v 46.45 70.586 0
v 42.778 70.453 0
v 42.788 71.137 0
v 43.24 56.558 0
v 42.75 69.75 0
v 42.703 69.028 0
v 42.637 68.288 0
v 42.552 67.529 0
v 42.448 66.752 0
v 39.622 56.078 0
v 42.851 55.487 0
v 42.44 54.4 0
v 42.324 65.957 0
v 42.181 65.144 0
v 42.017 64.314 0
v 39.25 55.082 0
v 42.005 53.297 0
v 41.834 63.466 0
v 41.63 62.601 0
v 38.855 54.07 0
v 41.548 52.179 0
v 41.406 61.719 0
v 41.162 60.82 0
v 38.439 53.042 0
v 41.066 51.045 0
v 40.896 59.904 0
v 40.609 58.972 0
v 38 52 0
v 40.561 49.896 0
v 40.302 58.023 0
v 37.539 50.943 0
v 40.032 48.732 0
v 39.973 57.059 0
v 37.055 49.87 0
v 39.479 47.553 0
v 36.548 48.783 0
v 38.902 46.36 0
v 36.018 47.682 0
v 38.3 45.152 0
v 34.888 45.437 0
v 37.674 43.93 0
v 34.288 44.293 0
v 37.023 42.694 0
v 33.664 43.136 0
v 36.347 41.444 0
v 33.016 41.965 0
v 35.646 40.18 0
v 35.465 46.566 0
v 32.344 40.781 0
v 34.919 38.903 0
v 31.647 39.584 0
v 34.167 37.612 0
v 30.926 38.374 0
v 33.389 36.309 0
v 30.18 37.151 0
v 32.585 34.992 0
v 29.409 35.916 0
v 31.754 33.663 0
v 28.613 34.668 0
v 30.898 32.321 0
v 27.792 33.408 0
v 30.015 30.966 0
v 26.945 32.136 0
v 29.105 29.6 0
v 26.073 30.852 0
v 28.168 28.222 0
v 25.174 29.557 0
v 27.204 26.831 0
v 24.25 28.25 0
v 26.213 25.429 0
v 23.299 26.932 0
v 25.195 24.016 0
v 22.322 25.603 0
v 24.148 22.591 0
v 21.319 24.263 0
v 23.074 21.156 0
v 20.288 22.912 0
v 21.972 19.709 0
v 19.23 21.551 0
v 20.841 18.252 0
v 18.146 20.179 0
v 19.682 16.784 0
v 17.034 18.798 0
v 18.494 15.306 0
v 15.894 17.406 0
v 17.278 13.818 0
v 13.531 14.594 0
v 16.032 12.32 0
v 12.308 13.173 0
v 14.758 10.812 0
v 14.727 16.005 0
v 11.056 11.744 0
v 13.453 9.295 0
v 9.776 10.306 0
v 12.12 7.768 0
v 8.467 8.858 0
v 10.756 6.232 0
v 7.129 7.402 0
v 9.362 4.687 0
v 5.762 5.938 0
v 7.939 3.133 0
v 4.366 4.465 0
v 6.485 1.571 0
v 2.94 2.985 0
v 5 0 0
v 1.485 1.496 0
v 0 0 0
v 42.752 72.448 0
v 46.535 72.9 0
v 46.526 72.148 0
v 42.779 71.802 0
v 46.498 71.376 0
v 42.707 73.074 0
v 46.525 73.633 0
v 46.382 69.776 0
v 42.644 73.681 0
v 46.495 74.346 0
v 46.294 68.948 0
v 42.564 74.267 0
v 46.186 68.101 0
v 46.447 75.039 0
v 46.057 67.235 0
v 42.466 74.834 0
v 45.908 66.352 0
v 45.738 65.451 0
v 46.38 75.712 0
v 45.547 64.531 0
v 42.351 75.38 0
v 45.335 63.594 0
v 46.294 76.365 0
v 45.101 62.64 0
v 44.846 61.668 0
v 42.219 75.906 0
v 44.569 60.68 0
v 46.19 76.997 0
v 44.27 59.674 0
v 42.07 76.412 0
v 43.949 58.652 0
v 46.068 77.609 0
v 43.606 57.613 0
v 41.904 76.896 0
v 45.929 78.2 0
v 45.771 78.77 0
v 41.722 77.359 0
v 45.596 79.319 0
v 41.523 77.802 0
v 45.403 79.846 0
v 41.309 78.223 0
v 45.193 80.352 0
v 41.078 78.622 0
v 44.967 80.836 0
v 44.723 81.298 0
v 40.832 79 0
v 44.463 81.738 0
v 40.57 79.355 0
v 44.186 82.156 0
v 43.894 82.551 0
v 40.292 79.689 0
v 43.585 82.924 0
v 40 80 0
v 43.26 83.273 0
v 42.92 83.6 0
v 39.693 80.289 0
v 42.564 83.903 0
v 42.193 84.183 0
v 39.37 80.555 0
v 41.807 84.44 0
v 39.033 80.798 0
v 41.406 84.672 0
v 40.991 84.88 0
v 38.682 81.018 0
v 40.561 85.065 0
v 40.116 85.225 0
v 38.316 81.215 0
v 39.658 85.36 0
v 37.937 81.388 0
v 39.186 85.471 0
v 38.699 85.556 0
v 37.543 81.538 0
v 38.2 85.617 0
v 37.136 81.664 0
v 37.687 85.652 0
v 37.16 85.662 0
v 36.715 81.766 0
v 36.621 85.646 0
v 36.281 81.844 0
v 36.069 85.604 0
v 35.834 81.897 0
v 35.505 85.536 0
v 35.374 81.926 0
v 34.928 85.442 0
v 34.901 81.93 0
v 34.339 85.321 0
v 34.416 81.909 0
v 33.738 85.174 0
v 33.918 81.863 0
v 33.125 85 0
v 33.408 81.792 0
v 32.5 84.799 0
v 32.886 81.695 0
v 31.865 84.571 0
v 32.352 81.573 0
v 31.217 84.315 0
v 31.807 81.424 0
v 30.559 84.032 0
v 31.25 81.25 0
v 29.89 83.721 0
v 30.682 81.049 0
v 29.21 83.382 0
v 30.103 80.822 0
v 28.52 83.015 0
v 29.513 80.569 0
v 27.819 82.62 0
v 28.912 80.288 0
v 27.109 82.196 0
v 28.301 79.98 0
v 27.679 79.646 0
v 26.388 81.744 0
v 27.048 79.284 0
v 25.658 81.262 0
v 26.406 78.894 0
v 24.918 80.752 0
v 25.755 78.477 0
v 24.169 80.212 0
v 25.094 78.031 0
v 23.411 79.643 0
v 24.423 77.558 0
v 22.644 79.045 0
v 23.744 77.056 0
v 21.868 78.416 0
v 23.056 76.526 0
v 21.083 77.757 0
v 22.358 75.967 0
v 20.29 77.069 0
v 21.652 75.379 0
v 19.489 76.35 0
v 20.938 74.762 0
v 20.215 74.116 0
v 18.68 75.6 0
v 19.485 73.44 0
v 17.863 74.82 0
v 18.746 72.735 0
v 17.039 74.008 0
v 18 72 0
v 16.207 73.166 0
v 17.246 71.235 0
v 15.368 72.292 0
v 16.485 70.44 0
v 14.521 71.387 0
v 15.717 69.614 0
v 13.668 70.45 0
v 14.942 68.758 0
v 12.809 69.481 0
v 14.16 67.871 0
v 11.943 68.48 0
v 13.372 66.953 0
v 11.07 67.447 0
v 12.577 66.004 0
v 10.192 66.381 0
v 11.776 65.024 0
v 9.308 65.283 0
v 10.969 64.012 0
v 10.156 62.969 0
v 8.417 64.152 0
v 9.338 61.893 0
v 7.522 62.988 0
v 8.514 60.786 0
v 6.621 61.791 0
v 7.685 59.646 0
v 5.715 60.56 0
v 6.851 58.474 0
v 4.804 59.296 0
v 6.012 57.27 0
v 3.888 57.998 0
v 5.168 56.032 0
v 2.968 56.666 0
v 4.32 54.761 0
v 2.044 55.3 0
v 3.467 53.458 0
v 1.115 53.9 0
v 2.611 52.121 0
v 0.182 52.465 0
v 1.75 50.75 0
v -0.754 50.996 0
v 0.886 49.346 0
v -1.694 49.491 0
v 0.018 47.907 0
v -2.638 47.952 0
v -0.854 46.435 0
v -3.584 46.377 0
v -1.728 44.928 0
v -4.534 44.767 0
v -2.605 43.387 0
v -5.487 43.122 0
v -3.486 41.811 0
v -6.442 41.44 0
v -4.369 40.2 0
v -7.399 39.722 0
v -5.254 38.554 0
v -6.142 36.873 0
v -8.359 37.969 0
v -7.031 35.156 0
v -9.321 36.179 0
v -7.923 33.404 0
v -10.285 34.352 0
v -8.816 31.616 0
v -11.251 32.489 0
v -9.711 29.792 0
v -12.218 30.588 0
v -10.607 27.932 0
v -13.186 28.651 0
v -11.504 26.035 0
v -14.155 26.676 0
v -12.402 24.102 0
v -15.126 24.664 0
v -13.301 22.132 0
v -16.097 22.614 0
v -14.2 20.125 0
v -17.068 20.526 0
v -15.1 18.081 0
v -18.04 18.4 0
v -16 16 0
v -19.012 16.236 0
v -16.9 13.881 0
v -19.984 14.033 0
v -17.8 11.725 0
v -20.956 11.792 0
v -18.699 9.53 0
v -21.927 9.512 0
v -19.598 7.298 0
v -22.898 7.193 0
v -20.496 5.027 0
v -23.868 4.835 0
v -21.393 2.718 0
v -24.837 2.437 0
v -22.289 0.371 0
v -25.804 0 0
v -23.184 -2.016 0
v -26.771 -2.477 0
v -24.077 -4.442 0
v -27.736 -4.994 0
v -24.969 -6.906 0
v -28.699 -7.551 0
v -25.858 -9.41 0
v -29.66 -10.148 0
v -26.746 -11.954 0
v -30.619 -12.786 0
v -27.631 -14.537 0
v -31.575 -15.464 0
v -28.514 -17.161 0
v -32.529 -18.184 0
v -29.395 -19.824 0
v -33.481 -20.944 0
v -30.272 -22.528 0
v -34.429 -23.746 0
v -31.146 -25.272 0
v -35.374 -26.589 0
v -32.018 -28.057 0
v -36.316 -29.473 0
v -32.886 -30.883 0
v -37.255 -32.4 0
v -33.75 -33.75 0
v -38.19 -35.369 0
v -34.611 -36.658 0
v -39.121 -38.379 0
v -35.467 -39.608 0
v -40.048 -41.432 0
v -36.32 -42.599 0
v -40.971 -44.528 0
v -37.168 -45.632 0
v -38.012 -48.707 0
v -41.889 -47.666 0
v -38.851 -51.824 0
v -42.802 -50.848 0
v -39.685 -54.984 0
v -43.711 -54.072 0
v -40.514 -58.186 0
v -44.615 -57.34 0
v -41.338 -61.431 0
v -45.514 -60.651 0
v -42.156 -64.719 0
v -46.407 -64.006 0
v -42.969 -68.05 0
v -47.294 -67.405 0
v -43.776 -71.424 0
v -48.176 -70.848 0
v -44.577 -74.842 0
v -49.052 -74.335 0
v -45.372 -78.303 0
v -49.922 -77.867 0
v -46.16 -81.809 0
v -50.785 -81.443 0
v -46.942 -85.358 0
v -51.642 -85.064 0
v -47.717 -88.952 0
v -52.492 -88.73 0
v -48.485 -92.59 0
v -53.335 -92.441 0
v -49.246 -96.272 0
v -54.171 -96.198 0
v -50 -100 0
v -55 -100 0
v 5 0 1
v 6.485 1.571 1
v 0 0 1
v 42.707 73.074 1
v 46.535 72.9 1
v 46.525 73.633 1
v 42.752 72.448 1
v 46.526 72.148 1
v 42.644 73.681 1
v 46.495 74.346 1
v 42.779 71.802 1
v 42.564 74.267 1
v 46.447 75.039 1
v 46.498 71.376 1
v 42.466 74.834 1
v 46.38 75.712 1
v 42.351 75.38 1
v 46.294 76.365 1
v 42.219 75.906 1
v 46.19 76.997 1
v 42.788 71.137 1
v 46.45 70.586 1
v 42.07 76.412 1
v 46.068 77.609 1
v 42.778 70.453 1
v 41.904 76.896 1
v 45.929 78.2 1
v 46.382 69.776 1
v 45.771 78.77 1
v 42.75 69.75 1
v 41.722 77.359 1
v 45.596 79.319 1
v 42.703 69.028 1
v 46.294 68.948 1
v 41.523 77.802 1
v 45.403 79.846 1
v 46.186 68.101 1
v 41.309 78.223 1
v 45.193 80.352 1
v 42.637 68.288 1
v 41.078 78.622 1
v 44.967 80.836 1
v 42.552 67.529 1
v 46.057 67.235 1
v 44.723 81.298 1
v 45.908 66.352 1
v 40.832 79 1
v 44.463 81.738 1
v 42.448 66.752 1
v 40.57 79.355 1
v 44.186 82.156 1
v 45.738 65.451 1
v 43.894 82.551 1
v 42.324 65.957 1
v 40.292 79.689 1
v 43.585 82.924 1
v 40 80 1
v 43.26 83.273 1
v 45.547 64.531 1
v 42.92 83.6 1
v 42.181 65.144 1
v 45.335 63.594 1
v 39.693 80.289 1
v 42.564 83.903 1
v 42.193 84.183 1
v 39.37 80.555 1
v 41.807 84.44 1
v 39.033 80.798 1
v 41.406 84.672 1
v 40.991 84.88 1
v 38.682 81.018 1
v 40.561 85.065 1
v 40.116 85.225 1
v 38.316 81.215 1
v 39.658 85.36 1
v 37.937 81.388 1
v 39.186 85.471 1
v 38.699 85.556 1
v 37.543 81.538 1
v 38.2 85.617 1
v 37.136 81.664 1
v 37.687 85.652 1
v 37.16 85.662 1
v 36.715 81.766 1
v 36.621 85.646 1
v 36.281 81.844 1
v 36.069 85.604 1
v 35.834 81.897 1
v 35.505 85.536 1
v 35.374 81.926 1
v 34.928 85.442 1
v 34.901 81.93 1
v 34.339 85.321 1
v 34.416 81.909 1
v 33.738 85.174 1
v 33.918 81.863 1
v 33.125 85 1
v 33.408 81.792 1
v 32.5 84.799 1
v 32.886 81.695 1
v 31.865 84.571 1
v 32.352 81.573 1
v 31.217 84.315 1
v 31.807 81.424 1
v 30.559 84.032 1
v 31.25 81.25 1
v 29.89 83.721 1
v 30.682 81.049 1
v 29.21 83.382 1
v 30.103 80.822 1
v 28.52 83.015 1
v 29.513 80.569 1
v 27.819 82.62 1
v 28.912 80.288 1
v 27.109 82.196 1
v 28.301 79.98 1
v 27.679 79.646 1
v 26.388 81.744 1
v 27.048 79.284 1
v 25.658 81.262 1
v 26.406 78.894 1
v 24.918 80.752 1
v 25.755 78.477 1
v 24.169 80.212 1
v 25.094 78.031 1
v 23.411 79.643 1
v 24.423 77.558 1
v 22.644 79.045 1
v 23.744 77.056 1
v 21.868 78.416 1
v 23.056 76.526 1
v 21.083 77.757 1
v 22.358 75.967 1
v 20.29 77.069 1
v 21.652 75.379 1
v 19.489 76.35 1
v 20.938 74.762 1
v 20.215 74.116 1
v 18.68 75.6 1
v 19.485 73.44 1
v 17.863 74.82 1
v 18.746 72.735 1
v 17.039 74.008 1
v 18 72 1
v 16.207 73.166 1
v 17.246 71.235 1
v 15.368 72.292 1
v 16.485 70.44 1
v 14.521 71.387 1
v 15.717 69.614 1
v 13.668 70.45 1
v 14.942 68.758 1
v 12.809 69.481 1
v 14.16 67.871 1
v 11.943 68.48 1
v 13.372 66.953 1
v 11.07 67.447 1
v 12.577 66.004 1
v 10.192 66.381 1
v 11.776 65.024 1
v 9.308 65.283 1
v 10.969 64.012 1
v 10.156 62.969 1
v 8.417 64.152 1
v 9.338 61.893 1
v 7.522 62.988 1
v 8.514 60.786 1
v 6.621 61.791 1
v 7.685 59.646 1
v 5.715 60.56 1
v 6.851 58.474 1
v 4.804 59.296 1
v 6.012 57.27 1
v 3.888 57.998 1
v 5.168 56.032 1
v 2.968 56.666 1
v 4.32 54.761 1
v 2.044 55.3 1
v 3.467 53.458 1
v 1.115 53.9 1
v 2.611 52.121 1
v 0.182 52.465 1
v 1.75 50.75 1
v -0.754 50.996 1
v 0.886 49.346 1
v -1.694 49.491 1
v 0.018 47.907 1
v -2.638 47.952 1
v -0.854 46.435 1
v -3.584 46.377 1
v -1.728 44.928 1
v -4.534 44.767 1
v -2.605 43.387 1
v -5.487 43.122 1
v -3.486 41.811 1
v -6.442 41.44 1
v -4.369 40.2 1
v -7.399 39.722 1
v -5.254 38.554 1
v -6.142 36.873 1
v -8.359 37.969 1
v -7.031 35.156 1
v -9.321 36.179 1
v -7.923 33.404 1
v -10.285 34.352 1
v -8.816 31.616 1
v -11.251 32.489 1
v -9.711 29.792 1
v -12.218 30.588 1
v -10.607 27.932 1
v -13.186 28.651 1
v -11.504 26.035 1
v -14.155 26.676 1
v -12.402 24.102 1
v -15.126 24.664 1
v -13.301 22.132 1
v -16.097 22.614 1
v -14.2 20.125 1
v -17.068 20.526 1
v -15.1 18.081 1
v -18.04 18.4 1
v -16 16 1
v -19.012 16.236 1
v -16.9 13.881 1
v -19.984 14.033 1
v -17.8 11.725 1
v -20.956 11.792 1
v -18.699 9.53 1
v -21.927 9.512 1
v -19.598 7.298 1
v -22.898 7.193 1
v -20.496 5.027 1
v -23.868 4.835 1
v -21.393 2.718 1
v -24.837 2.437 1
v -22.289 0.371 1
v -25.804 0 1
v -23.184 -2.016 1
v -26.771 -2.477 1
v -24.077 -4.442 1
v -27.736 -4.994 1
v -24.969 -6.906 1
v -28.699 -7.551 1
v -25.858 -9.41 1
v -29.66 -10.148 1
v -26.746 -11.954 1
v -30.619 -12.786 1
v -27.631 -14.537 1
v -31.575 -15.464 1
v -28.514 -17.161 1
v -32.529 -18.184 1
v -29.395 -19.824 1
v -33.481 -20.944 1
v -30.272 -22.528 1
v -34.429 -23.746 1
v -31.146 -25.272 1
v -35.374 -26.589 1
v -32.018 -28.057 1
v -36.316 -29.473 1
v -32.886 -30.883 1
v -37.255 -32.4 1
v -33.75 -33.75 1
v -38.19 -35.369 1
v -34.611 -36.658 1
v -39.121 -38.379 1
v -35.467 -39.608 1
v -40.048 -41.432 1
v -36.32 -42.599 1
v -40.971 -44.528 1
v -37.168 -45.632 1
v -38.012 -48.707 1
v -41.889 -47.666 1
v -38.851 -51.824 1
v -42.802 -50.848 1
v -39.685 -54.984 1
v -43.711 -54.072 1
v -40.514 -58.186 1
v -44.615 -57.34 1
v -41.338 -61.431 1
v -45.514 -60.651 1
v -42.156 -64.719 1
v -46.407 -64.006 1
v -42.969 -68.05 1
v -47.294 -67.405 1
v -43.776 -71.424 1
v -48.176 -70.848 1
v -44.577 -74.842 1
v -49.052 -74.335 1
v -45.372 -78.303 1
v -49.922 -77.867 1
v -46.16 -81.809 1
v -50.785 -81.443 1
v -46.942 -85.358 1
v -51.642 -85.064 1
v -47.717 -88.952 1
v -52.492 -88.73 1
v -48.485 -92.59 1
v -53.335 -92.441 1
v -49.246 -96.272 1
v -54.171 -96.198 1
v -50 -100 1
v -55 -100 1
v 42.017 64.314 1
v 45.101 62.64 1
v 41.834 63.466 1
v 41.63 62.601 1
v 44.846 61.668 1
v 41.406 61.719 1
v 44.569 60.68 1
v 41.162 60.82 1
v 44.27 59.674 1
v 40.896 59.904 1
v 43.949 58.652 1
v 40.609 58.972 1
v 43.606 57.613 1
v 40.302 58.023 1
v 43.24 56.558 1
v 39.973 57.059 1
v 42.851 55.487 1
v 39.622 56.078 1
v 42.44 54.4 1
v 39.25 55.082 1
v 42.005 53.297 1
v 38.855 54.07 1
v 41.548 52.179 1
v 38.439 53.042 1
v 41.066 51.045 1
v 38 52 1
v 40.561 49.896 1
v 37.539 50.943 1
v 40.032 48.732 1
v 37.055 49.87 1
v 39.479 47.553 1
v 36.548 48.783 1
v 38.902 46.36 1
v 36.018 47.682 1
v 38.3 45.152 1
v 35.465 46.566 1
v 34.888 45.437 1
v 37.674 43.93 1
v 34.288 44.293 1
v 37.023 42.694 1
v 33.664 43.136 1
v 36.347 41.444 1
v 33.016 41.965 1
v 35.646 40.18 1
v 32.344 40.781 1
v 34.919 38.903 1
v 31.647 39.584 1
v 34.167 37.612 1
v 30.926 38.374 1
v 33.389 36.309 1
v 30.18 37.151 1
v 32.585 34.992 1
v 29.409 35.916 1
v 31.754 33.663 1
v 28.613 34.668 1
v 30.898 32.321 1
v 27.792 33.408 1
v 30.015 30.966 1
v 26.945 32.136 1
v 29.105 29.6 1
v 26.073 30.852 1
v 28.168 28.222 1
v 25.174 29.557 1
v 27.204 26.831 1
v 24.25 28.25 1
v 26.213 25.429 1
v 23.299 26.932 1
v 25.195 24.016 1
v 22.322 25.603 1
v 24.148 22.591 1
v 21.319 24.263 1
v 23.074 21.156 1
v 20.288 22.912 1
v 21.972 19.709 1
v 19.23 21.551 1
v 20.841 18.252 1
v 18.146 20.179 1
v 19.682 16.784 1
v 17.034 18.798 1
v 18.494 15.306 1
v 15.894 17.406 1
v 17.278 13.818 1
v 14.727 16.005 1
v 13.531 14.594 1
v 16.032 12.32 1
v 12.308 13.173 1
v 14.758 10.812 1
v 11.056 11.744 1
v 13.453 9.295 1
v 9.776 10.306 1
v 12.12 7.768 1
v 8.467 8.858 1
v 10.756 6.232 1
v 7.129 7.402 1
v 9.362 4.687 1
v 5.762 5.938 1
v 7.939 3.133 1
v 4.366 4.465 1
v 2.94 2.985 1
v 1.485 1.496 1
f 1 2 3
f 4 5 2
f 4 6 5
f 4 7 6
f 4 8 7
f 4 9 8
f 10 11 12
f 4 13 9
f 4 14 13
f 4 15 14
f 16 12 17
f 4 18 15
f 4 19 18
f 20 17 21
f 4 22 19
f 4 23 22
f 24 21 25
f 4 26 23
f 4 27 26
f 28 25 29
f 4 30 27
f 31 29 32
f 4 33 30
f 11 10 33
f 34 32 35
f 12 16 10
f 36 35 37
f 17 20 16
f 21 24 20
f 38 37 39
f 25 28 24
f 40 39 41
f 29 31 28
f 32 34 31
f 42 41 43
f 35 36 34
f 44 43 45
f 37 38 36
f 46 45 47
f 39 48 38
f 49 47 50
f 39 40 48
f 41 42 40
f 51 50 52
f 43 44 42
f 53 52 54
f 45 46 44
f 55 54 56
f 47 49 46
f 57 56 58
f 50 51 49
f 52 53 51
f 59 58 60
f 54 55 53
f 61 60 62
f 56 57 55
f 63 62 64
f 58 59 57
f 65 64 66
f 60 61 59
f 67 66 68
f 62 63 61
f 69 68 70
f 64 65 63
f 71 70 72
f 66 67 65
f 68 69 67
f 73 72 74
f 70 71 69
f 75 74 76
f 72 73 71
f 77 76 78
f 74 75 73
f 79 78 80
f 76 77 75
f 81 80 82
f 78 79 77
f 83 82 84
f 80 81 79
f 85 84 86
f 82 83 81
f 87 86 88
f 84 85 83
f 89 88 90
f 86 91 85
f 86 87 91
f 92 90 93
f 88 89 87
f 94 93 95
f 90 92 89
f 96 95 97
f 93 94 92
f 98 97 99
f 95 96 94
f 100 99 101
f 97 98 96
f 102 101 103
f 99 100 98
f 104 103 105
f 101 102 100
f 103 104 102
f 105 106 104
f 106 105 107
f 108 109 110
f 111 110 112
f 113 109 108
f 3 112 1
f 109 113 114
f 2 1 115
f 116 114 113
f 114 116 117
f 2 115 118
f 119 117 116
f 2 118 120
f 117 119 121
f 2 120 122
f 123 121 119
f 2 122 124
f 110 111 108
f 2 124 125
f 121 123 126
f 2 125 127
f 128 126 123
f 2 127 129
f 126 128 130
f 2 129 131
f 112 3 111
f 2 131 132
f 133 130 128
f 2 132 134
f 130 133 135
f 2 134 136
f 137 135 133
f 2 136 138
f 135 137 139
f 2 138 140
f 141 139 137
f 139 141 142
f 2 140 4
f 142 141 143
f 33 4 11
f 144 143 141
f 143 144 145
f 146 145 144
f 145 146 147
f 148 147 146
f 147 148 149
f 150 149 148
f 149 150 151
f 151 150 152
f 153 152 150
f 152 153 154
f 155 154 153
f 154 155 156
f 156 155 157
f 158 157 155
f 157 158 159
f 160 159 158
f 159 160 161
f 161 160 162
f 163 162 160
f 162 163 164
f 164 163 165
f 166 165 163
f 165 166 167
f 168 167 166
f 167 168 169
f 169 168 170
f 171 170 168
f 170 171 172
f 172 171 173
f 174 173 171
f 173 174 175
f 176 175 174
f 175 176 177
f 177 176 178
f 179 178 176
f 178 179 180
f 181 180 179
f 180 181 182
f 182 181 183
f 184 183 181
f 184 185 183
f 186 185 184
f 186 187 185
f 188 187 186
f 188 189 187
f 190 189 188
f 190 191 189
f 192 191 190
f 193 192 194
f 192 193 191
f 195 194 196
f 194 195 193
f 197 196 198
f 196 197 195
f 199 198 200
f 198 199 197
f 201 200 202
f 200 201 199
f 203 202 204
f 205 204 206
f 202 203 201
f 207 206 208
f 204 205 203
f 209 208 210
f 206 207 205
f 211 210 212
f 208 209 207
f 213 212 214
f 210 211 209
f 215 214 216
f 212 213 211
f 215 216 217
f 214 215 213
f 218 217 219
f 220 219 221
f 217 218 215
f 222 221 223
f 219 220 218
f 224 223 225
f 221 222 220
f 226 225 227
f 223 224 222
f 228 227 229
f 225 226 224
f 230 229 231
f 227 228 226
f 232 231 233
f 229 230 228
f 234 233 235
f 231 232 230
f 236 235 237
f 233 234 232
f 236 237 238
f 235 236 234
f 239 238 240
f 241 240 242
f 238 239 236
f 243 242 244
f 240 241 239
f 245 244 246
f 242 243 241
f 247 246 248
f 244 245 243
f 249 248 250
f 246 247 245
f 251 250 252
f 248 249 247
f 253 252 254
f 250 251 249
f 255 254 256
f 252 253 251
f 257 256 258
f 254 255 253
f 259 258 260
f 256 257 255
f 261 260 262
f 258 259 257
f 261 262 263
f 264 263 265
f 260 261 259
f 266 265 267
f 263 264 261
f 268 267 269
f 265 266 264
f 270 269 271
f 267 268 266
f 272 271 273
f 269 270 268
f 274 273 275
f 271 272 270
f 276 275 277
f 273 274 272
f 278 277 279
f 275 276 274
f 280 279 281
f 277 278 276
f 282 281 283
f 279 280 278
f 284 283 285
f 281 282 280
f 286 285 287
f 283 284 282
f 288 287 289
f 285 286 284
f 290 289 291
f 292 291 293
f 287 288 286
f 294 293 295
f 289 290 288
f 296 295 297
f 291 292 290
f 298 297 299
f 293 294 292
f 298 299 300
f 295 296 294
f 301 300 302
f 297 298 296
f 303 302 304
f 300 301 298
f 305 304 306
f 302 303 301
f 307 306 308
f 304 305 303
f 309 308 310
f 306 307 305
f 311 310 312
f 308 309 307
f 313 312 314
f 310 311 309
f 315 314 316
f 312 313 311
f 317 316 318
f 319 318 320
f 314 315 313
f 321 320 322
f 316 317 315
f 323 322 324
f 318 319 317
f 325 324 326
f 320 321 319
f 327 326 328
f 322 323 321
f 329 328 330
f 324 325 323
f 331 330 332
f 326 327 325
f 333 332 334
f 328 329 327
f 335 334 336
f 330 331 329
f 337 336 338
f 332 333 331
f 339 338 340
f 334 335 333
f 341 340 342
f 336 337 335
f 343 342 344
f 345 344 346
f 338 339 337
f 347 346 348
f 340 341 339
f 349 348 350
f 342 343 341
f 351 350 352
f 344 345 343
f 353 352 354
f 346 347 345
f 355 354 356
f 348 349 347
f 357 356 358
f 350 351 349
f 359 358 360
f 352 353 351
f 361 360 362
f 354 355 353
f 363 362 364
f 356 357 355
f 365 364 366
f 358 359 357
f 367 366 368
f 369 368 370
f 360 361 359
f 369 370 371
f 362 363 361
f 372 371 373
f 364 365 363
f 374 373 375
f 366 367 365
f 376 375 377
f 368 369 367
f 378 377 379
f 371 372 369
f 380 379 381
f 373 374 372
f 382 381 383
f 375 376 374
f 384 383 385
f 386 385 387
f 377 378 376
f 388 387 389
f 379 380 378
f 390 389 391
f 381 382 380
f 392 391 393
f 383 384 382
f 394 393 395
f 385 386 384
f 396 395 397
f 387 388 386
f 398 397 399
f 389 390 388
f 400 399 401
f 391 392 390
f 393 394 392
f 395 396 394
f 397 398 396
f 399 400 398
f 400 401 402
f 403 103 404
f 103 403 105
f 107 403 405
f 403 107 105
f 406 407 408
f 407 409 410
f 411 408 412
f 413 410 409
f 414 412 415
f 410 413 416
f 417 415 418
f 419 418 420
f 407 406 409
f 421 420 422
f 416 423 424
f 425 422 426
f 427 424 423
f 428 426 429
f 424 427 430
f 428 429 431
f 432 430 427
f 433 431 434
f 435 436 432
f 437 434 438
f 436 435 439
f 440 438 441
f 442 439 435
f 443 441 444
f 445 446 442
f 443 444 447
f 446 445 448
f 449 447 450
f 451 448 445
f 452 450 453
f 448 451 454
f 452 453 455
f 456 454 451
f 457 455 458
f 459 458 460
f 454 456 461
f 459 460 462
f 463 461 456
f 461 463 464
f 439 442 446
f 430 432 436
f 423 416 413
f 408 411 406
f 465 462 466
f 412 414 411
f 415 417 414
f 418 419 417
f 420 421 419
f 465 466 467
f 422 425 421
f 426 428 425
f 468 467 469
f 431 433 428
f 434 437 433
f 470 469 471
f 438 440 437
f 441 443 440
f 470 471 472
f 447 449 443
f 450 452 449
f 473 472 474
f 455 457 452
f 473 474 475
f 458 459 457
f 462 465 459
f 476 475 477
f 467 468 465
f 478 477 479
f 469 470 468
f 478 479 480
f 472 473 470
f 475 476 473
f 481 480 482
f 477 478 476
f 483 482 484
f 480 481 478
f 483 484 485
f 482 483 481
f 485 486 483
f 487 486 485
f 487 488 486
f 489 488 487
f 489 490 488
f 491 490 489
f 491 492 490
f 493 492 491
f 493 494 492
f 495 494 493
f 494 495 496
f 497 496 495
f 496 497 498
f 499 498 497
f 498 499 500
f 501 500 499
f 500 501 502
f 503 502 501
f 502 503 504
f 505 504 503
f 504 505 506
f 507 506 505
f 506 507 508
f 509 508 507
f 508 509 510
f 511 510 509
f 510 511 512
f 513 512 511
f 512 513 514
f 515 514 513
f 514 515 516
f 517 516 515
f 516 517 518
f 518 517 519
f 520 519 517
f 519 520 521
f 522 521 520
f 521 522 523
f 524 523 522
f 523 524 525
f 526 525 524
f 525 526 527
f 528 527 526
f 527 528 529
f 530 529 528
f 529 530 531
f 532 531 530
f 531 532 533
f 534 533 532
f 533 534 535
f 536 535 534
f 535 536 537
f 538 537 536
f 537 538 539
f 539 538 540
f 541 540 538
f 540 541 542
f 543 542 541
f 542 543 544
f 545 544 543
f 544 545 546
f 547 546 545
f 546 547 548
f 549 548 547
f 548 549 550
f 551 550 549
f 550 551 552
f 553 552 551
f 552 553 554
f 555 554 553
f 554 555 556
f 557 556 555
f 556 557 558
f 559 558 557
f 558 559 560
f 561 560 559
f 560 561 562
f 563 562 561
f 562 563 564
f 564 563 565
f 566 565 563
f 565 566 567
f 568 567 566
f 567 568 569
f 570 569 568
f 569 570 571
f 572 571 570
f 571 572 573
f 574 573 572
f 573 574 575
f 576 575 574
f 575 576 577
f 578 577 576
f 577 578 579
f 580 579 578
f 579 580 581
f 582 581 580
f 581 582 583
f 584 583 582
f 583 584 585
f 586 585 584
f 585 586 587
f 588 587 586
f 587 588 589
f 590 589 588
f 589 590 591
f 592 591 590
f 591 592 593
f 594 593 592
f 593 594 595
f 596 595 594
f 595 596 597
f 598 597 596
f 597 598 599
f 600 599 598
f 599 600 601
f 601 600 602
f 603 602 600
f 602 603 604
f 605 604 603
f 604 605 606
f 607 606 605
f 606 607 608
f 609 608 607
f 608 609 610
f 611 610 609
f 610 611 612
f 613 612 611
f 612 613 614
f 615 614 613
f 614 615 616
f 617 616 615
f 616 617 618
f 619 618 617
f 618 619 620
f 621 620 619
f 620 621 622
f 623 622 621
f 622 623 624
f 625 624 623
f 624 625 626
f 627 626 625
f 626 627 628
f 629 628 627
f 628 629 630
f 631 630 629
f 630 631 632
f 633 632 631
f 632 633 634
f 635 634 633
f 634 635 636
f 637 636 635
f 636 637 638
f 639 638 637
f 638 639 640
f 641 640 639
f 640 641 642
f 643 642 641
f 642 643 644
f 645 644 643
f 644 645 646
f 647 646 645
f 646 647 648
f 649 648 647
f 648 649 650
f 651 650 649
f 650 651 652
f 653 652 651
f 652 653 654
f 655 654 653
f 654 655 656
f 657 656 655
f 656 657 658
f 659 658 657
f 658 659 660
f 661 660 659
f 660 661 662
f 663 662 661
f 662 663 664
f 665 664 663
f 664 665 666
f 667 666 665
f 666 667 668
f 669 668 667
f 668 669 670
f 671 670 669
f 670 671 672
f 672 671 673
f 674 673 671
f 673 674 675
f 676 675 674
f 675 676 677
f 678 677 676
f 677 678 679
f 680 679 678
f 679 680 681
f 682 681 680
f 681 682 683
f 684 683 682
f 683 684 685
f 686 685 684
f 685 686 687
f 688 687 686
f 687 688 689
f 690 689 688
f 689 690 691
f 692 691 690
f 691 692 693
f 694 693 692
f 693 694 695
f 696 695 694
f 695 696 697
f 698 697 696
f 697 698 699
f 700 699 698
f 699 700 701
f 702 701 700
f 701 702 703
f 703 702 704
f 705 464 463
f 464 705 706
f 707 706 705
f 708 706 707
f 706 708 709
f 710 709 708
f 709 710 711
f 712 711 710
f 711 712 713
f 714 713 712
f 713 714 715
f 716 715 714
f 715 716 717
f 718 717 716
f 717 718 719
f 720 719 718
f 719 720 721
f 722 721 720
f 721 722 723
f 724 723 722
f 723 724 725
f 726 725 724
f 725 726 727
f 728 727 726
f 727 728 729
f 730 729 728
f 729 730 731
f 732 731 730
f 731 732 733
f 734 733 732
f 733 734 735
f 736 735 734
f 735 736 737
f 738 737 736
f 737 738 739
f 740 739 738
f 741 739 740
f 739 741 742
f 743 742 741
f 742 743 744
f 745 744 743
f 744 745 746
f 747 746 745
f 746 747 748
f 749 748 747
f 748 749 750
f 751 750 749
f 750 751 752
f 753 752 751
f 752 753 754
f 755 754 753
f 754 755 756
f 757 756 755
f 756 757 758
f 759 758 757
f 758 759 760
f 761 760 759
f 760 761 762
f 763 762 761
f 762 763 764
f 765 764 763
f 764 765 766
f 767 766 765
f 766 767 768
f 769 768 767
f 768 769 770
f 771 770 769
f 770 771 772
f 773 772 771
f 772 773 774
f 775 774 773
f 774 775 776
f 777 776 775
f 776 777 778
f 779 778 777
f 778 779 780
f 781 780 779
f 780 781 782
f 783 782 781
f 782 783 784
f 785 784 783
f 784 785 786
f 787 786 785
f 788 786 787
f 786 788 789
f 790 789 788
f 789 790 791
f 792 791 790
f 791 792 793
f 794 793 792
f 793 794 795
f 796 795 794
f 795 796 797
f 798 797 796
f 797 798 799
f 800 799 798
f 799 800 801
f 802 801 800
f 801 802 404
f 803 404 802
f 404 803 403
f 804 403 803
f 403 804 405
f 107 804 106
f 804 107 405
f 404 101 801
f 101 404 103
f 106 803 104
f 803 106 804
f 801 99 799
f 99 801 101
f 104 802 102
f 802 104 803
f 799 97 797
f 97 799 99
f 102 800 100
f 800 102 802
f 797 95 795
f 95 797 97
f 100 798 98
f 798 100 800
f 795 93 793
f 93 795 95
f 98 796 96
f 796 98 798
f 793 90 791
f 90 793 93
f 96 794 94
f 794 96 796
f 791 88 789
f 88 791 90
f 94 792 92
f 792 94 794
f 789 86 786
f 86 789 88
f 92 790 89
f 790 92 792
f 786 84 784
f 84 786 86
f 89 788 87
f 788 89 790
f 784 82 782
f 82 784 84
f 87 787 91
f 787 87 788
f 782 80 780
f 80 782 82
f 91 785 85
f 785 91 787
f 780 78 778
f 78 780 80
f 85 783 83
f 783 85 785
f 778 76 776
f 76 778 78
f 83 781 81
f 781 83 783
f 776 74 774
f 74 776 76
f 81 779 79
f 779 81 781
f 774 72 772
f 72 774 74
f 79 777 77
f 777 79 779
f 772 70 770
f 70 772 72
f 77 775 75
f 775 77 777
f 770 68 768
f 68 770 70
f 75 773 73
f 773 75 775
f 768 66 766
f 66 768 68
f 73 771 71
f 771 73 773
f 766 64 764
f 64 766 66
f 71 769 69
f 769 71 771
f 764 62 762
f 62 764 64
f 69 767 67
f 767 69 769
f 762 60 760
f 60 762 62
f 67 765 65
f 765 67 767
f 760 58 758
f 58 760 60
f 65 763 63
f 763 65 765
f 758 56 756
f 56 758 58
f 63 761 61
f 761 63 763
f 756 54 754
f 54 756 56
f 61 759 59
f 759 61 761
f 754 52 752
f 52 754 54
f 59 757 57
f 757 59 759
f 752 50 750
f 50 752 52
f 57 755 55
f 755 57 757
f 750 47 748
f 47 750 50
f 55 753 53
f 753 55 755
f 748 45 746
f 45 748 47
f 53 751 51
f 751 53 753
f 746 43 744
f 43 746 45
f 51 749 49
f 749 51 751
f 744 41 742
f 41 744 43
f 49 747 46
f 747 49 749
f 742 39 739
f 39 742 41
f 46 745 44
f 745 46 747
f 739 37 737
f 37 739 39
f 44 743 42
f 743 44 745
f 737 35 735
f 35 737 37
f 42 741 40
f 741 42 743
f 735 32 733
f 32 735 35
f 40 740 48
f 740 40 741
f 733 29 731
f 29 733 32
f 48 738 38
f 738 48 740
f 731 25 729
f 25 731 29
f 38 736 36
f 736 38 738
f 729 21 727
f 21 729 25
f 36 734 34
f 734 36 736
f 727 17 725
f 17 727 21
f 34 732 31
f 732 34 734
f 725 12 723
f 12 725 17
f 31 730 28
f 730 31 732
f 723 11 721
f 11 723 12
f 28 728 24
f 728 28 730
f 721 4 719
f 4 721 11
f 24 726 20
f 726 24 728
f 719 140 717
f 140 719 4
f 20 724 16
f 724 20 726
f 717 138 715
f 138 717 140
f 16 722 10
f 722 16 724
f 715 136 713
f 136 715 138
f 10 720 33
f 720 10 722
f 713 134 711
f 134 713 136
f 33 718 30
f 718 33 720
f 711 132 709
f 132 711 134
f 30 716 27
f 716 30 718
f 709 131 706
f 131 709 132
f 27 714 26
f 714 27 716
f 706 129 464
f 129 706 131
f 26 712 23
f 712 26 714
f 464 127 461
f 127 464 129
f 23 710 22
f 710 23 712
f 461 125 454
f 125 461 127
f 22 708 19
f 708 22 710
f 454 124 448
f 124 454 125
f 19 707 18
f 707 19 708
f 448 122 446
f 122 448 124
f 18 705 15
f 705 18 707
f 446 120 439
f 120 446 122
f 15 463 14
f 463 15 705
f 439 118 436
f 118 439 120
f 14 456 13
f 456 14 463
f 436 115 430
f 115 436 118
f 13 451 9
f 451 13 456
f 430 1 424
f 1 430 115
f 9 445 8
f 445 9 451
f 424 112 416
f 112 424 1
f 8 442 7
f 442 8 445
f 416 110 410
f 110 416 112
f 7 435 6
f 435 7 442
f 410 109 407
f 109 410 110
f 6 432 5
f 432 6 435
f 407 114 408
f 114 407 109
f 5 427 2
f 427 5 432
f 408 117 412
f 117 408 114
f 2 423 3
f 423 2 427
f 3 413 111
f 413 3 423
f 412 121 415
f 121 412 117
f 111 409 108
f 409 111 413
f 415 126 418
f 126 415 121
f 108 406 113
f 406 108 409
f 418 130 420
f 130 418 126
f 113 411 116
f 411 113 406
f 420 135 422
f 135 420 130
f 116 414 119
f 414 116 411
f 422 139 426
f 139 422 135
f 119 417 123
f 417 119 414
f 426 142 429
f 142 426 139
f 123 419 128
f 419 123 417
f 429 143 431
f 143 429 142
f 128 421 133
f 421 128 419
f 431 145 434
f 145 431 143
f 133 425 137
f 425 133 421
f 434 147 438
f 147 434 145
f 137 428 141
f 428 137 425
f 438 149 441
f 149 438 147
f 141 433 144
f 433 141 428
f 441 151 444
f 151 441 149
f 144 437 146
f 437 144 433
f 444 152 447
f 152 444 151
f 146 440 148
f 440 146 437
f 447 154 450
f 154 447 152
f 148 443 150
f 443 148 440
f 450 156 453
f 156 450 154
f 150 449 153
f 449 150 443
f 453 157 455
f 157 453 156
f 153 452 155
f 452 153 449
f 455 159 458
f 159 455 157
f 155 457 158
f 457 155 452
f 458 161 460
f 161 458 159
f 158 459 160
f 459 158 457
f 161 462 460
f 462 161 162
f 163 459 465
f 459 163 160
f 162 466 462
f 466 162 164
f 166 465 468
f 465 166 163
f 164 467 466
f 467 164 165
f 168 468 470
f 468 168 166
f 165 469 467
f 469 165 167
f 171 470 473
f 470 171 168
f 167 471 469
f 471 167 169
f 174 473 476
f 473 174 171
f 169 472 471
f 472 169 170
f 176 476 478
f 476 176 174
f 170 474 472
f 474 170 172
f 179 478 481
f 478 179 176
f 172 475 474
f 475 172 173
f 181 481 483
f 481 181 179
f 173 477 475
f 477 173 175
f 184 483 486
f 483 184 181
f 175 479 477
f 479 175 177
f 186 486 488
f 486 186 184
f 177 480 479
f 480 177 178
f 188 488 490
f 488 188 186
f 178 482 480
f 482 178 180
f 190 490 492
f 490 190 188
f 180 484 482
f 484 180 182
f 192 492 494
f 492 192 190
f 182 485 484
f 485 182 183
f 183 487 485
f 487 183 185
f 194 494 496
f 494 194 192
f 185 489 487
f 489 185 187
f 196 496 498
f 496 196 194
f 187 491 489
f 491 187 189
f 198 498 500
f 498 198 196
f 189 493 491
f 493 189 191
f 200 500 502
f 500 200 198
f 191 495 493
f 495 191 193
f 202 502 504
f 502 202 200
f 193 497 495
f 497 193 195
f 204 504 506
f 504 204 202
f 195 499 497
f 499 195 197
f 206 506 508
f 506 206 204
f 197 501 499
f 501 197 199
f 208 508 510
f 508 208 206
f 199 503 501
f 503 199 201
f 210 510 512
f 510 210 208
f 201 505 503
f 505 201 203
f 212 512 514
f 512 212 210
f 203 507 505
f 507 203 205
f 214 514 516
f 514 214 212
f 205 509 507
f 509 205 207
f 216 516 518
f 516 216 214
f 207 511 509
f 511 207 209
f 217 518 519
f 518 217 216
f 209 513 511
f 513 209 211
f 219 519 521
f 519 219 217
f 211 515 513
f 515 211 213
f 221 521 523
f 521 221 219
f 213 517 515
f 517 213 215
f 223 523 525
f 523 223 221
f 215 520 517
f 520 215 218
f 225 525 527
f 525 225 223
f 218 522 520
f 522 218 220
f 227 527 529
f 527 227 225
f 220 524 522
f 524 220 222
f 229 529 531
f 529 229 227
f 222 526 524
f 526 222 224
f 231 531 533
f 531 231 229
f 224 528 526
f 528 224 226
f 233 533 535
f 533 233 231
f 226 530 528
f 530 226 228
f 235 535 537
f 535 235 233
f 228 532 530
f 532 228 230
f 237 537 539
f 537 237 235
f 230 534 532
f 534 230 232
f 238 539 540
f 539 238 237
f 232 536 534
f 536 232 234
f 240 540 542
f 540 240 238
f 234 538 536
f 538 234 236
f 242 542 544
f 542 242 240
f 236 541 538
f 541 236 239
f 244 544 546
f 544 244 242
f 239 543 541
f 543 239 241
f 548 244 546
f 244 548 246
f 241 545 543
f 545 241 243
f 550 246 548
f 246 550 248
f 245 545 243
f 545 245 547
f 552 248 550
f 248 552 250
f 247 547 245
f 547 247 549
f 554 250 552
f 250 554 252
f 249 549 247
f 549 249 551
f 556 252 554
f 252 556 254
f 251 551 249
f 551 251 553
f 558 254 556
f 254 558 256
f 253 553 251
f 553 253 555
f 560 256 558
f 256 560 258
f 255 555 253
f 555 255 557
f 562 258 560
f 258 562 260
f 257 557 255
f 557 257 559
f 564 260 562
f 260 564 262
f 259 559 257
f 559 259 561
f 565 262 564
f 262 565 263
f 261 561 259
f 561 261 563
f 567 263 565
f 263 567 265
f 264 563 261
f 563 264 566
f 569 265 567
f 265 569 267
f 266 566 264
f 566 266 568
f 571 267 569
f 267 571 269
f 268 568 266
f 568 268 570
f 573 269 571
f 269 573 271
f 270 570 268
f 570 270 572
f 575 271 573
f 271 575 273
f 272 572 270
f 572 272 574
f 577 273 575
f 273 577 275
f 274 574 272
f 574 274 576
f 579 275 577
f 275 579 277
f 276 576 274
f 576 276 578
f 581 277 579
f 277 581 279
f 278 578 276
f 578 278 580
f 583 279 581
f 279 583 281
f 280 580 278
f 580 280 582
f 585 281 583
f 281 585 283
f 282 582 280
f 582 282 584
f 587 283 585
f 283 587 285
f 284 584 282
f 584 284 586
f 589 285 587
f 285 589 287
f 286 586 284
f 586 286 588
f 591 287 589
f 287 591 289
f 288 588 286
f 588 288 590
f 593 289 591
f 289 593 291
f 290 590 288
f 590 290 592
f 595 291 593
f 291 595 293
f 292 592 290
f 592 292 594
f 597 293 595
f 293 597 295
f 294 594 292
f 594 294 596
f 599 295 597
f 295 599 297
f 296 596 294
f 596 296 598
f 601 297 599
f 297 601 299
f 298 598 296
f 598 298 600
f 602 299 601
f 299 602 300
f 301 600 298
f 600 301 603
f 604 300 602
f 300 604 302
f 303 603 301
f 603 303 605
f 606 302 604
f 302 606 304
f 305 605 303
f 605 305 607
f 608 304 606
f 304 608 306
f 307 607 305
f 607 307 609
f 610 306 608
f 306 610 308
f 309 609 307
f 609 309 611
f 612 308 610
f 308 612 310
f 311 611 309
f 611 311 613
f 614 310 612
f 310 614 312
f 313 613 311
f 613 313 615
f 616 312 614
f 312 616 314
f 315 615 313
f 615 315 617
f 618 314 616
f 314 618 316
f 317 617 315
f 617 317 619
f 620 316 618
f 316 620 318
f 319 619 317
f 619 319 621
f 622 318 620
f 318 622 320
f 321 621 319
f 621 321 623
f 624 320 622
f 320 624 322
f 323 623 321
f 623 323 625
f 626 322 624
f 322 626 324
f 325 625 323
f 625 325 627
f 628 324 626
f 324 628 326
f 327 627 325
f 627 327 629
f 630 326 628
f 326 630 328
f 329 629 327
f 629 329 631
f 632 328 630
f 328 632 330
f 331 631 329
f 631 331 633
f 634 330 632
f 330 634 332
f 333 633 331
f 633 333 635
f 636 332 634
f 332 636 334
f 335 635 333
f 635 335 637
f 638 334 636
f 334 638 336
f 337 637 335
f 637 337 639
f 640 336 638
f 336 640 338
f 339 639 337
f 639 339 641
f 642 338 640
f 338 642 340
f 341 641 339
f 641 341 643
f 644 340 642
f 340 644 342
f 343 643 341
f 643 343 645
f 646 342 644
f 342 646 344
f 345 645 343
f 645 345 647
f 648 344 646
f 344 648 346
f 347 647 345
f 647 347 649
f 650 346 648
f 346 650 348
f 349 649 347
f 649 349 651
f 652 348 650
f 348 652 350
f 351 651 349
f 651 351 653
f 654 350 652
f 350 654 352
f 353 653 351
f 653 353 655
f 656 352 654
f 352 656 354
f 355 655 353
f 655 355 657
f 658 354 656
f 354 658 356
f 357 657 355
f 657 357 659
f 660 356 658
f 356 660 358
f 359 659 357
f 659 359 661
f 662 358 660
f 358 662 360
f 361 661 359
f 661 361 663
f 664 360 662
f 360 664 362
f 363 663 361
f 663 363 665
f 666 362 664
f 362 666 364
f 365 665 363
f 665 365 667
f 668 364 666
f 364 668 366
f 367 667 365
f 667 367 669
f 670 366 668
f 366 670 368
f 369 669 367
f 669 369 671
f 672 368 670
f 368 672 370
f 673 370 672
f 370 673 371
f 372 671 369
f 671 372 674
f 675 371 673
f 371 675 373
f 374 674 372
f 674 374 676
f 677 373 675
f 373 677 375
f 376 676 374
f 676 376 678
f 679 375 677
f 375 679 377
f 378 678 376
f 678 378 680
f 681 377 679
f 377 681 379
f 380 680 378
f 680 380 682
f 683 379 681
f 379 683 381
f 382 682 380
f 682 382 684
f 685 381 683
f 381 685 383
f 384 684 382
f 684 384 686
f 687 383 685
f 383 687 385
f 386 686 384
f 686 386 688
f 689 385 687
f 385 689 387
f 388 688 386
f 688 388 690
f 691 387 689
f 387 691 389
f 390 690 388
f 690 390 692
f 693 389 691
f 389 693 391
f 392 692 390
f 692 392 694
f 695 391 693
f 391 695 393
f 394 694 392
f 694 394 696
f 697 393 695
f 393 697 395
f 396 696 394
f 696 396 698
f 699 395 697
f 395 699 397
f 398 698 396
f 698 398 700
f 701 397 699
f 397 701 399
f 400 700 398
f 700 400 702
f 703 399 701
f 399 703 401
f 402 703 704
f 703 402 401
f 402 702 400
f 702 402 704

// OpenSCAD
// file: bezier.scad
//=====================================
// This is public Domain Code
// Contributed by: William A Adams
// 11 May 2011
//=====================================
joinfactor = 0.125;

gSteps = 4;
gHeight = 4;


//=======================================
// Functions
// These are the 4 blending functions for a cubic bezier curve
//=======================================

/*
	Bernstein Basis Functions

	For Bezier curves, these functions give the weights per control point.
	
*/
function BEZ03(u) = pow((1-u), 3);
function BEZ13(u) = 3*u*(pow((1-u),2));
function BEZ23(u) = 3*(pow(u,2))*(1-u);
function BEZ33(u) = pow(u,3);

// Calculate a singe point along a cubic bezier curve
// Given a set of 4 control points, and a parameter 0 <= 'u' <= 1
// These functions will return the exact point on the curve
function PointOnBezCubic2D(p0, p1, p2, p3, u) = [
	BEZ03(u)*p0[0]+BEZ13(u)*p1[0]+BEZ23(u)*p2[0]+BEZ33(u)*p3[0],
	BEZ03(u)*p0[1]+BEZ13(u)*p1[1]+BEZ23(u)*p2[1]+BEZ33(u)*p3[1]];

function PointOnBezCubic3D(p0, p1, p2, p3, u) = [
	BEZ03(u)*p0[0]+BEZ13(u)*p1[0]+BEZ23(u)*p2[0]+BEZ33(u)*p3[0],
	BEZ03(u)*p0[1]+BEZ13(u)*p1[1]+BEZ23(u)*p2[1]+BEZ33(u)*p3[1],
	BEZ03(u)*p0[2]+BEZ13(u)*p1[2]+BEZ23(u)*p2[2]+BEZ33(u)*p3[2]];

//=======================================
// Modules
//=======================================
// This function will extrude a bezier solid from a bezier curve
// It is a straight up prism
// c - ControlPoints
//
module BezCubicFillet(c, focalPoint, steps=gSteps, height=gHeight)
{
	for(step = [steps:1])
	{
		linear_extrude(height = height, convexity = 10) 
		polygon(
			points=[
				focalPoint,
				PointOnBezCubic2D(c[0], c[1], c[2],c[3], step/steps),
				PointOnBezCubic2D(c[0], c[1], c[2],c[3], (step-1)/steps)],
			paths=[[0,1,2,0]]
		);
	}
}

module BezCubicFilletColored(c, focalPoint, steps=gSteps, height=gHeight, colors)
{
	for(step = [steps:1])
	{
		color(PointOnBezCubic3D(colors[0], colors[1], colors[2], colors[3], step/steps))
		linear_extrude(height = height, convexity = 10) 
		polygon(
			points=[
				focalPoint,
				PointOnBezCubic2D(c[0], c[1], c[2],c[3], step/steps),
				PointOnBezCubic2D(c[0], c[1], c[2],c[3], (step-1)/steps)],
			paths=[[0,1,2,0]]
		);
	}
}


module BezCubicRibbon(c1, c2, steps=gSteps, height=gHeight, colors=[[1,0,0],[1,1,0],[0,1,1],[0,0,1]])
{
	for (step=[0:steps-1])
	{
		color(PointOnBezCubic3D(colors[0], colors[1], colors[2], colors[3], step/steps))
		linear_extrude(height = height, convexity = 10) 
		polygon(
			points=[
				PointOnBezCubic2D(c1[0], c1[1], c1[2],c1[3], step/steps),
				PointOnBezCubic2D(c2[0], c2[1], c2[2],c2[3], (step)/steps),
				PointOnBezCubic2D(c2[0], c2[1], c2[2],c2[3], (step+1)/steps),
				PointOnBezCubic2D(c1[0], c1[1], c1[2],c1[3], (step+1)/steps)],
			paths=[[0,1,2,3]]
		);

	}
}

module BezCubicRibbonRotate(c1, c2, steps=gSteps, height=gHeight, colors=[[1,0,0],[1,1,0],[0,1,1],[0,0,1]])
{
	for (step=[0:steps-1])
	{
		color(PointOnBezCubic3D(colors[0], colors[1], colors[2], colors[3], step/steps))
		rotate_extrude(convexity=10) 
		polygon(
			points=[
				PointOnBezCubic2D(c1[0], c1[1], c1[2],c1[3], step/steps),
				PointOnBezCubic2D(c2[0], c2[1], c2[2],c2[3], (step)/steps),
				PointOnBezCubic2D(c2[0], c2[1], c2[2],c2[3], (step+1)/steps),
				PointOnBezCubic2D(c1[0], c1[1], c1[2],c1[3], (step+1)/steps)],
			paths=[[0,1,2,3]]
		);
	}
}
// main file
//=====================================
// This is public Domain Code
// Contributed by: William A Adams
//=====================================

include <bezier.scad>

joinfactor = 0.125;

gDemoSteps = 200;
gDemoHeight =14;

//======================================
// Demos
//======================================
*BezCubicFilletColored( [[0, 15],[5,5],[10,5],[15,15]], [7.5,12], gDemoSteps, gDemoHeight, 
	[[1,0,0],[1,1,0],[0,1,1],[0,0,1]]);

//BezCubicFilletColored( [[0, 15],[5,5],[10,5],[15,15]], [7.5,18], gSteps, gHeight, 
//	[[1,0,0],[0,1,0],[0,1,0],[0,0,1]]);
//DrawCubicControlPoints([[0, 15],[5,5],[10,5],[15,15]], [7.5,18], gHeight, $fn=12);

*BezCubicFillet( [[0, 5],[5,15],[10,3],[15,10]], [7.5,0], gSteps, gHeight);
*DrawCubicControlPoints( [[0, 5],[5,15],[10,3],[15,10]], [7.5,0], gHeight, $fn=12);

*BezCubicRibbon([[0,15],[6,13],[3,5],[15,0]], [[0,13],[6,11],[3,2],[13,0]]);


*BezCubicRibbonRotate([[0,15],[6,13],[3,5],[15,0]], [[0,13],[6,11],[3,2],[13,0]], $fn=100);

BezCubicRibbon3D(
	[[0,0,200],[100,100,100],[0,150,100],[-50,-100,200]],
	[[5,0,0],[105,105,0],[0,155,0],[-55,-100,0]]
	);



//PlotBEZ0(100);
//PlotBEZ1(100);
//PlotBEZ2(100);
//PlotBEZ3(100);
//PlotBez4Blending();

//===================================
// Modules
//===================================

module PlotRectangle(sizer)
{
	scaler = 1;
echo(sizer[0], sizer[1], sizer[2]);

	translate([sizer[0]*scaler, sizer[1]*scaler, 0])
	cylinder(r=3, h=sizer[2]);	
//cube(size=[1,1,sizer[2]]);
}

module BezCubicRibbon3D(c1, c2, steps=gDemoSteps, colors=[[1,0,0],[1,1,0],[0,1,1],[0,0,1]])
{
	for (step=[0:steps-1]) 
	{
		color(PointOnBezCubic3D(colors[0], colors[1], colors[2], colors[3], step/steps))
		linear_extrude(height = 1, convexity = 10) 
		polygon(
			points=[
				PointOnBezCubic2D(c1[0], c1[1], c1[2],c1[3], step/steps),
				PointOnBezCubic2D(c2[0], c2[1], c2[2],c2[3], (step)/steps),
				PointOnBezCubic2D(c2[0], c2[1], c2[2],c2[3], (step+1)/steps),
				PointOnBezCubic2D(c1[0], c1[1], c1[2],c1[3], (step+1)/steps)],
			paths=[[0,1,2,3]]
	);

}

}

module DrawCubicControlPoints(c, focalPoint, height)
{
	// Draw control points
	// Start point
	translate(c[0])
	color([1,0,0])
	cylinder(r=0.5, h=height+joinfactor);

	// Controll point 1
	translate(c[1])
	color([0,0,0])
	cylinder(r=0.5, h=height+joinfactor);

	// Control point 2
	translate(c[2])
	color([0,0,0])
	cylinder(r=0.5, h=height+joinfactor);

	// End Point
	translate(c[3])
	color([0,0,1])
	cylinder(r=0.5, h=height+joinfactor);


	// Draw the focal point
	translate(focalPoint)
	color([0,1,0])
	cylinder(r=0.5, h=height+joinfactor);
}

module PlotBEZ0(steps)
{
	cubeSize = 1;
	cubeHeight = steps;

	for (step=[0:steps])
	{
		translate([cubeSize*step, 0, 0])
		cube(size=[cubeSize, cubeSize, BEZ03(step/steps)*cubeHeight]);
	}	
}

module PlotBEZ1(steps)
{
	cubeSize = 1;
	cubeHeight = steps;

	for (step=[0:steps])
	{
		translate([cubeSize*step, 0, 0])
		cube(size=[cubeSize, cubeSize, BEZ13(step/steps)*cubeHeight]);
	}	
}

module PlotBEZ2(steps)
{
	cubeSize = 1;
	cubeHeight = steps;

	for (step=[0:steps])
	{
		translate([cubeSize*step, 0, 0])
		cube(size=[cubeSize, cubeSize, BEZ23(step/steps)*cubeHeight]);
	}	
}

module PlotBEZ3(steps)
{
	cubeSize = 1;
	cubeHeight = steps;

	for (step=[0:steps])
	{
		translate([cubeSize*step, 0, 0])
		cube(size=[cubeSize, cubeSize, BEZ33(step/steps)*cubeHeight]);
	}	
}

module PlotBez4Blending()
{
	sizing = 100;

	translate([0, 0, sizing + 10])
	PlotBEZ0(100);

	translate([sizing+10, 0, sizing + 10])
	PlotBEZ1(100);

	translate([0, 0, 0])
	PlotBEZ2(100);

	translate([sizing+10, 0, 0])
	PlotBEZ3(100);
}
